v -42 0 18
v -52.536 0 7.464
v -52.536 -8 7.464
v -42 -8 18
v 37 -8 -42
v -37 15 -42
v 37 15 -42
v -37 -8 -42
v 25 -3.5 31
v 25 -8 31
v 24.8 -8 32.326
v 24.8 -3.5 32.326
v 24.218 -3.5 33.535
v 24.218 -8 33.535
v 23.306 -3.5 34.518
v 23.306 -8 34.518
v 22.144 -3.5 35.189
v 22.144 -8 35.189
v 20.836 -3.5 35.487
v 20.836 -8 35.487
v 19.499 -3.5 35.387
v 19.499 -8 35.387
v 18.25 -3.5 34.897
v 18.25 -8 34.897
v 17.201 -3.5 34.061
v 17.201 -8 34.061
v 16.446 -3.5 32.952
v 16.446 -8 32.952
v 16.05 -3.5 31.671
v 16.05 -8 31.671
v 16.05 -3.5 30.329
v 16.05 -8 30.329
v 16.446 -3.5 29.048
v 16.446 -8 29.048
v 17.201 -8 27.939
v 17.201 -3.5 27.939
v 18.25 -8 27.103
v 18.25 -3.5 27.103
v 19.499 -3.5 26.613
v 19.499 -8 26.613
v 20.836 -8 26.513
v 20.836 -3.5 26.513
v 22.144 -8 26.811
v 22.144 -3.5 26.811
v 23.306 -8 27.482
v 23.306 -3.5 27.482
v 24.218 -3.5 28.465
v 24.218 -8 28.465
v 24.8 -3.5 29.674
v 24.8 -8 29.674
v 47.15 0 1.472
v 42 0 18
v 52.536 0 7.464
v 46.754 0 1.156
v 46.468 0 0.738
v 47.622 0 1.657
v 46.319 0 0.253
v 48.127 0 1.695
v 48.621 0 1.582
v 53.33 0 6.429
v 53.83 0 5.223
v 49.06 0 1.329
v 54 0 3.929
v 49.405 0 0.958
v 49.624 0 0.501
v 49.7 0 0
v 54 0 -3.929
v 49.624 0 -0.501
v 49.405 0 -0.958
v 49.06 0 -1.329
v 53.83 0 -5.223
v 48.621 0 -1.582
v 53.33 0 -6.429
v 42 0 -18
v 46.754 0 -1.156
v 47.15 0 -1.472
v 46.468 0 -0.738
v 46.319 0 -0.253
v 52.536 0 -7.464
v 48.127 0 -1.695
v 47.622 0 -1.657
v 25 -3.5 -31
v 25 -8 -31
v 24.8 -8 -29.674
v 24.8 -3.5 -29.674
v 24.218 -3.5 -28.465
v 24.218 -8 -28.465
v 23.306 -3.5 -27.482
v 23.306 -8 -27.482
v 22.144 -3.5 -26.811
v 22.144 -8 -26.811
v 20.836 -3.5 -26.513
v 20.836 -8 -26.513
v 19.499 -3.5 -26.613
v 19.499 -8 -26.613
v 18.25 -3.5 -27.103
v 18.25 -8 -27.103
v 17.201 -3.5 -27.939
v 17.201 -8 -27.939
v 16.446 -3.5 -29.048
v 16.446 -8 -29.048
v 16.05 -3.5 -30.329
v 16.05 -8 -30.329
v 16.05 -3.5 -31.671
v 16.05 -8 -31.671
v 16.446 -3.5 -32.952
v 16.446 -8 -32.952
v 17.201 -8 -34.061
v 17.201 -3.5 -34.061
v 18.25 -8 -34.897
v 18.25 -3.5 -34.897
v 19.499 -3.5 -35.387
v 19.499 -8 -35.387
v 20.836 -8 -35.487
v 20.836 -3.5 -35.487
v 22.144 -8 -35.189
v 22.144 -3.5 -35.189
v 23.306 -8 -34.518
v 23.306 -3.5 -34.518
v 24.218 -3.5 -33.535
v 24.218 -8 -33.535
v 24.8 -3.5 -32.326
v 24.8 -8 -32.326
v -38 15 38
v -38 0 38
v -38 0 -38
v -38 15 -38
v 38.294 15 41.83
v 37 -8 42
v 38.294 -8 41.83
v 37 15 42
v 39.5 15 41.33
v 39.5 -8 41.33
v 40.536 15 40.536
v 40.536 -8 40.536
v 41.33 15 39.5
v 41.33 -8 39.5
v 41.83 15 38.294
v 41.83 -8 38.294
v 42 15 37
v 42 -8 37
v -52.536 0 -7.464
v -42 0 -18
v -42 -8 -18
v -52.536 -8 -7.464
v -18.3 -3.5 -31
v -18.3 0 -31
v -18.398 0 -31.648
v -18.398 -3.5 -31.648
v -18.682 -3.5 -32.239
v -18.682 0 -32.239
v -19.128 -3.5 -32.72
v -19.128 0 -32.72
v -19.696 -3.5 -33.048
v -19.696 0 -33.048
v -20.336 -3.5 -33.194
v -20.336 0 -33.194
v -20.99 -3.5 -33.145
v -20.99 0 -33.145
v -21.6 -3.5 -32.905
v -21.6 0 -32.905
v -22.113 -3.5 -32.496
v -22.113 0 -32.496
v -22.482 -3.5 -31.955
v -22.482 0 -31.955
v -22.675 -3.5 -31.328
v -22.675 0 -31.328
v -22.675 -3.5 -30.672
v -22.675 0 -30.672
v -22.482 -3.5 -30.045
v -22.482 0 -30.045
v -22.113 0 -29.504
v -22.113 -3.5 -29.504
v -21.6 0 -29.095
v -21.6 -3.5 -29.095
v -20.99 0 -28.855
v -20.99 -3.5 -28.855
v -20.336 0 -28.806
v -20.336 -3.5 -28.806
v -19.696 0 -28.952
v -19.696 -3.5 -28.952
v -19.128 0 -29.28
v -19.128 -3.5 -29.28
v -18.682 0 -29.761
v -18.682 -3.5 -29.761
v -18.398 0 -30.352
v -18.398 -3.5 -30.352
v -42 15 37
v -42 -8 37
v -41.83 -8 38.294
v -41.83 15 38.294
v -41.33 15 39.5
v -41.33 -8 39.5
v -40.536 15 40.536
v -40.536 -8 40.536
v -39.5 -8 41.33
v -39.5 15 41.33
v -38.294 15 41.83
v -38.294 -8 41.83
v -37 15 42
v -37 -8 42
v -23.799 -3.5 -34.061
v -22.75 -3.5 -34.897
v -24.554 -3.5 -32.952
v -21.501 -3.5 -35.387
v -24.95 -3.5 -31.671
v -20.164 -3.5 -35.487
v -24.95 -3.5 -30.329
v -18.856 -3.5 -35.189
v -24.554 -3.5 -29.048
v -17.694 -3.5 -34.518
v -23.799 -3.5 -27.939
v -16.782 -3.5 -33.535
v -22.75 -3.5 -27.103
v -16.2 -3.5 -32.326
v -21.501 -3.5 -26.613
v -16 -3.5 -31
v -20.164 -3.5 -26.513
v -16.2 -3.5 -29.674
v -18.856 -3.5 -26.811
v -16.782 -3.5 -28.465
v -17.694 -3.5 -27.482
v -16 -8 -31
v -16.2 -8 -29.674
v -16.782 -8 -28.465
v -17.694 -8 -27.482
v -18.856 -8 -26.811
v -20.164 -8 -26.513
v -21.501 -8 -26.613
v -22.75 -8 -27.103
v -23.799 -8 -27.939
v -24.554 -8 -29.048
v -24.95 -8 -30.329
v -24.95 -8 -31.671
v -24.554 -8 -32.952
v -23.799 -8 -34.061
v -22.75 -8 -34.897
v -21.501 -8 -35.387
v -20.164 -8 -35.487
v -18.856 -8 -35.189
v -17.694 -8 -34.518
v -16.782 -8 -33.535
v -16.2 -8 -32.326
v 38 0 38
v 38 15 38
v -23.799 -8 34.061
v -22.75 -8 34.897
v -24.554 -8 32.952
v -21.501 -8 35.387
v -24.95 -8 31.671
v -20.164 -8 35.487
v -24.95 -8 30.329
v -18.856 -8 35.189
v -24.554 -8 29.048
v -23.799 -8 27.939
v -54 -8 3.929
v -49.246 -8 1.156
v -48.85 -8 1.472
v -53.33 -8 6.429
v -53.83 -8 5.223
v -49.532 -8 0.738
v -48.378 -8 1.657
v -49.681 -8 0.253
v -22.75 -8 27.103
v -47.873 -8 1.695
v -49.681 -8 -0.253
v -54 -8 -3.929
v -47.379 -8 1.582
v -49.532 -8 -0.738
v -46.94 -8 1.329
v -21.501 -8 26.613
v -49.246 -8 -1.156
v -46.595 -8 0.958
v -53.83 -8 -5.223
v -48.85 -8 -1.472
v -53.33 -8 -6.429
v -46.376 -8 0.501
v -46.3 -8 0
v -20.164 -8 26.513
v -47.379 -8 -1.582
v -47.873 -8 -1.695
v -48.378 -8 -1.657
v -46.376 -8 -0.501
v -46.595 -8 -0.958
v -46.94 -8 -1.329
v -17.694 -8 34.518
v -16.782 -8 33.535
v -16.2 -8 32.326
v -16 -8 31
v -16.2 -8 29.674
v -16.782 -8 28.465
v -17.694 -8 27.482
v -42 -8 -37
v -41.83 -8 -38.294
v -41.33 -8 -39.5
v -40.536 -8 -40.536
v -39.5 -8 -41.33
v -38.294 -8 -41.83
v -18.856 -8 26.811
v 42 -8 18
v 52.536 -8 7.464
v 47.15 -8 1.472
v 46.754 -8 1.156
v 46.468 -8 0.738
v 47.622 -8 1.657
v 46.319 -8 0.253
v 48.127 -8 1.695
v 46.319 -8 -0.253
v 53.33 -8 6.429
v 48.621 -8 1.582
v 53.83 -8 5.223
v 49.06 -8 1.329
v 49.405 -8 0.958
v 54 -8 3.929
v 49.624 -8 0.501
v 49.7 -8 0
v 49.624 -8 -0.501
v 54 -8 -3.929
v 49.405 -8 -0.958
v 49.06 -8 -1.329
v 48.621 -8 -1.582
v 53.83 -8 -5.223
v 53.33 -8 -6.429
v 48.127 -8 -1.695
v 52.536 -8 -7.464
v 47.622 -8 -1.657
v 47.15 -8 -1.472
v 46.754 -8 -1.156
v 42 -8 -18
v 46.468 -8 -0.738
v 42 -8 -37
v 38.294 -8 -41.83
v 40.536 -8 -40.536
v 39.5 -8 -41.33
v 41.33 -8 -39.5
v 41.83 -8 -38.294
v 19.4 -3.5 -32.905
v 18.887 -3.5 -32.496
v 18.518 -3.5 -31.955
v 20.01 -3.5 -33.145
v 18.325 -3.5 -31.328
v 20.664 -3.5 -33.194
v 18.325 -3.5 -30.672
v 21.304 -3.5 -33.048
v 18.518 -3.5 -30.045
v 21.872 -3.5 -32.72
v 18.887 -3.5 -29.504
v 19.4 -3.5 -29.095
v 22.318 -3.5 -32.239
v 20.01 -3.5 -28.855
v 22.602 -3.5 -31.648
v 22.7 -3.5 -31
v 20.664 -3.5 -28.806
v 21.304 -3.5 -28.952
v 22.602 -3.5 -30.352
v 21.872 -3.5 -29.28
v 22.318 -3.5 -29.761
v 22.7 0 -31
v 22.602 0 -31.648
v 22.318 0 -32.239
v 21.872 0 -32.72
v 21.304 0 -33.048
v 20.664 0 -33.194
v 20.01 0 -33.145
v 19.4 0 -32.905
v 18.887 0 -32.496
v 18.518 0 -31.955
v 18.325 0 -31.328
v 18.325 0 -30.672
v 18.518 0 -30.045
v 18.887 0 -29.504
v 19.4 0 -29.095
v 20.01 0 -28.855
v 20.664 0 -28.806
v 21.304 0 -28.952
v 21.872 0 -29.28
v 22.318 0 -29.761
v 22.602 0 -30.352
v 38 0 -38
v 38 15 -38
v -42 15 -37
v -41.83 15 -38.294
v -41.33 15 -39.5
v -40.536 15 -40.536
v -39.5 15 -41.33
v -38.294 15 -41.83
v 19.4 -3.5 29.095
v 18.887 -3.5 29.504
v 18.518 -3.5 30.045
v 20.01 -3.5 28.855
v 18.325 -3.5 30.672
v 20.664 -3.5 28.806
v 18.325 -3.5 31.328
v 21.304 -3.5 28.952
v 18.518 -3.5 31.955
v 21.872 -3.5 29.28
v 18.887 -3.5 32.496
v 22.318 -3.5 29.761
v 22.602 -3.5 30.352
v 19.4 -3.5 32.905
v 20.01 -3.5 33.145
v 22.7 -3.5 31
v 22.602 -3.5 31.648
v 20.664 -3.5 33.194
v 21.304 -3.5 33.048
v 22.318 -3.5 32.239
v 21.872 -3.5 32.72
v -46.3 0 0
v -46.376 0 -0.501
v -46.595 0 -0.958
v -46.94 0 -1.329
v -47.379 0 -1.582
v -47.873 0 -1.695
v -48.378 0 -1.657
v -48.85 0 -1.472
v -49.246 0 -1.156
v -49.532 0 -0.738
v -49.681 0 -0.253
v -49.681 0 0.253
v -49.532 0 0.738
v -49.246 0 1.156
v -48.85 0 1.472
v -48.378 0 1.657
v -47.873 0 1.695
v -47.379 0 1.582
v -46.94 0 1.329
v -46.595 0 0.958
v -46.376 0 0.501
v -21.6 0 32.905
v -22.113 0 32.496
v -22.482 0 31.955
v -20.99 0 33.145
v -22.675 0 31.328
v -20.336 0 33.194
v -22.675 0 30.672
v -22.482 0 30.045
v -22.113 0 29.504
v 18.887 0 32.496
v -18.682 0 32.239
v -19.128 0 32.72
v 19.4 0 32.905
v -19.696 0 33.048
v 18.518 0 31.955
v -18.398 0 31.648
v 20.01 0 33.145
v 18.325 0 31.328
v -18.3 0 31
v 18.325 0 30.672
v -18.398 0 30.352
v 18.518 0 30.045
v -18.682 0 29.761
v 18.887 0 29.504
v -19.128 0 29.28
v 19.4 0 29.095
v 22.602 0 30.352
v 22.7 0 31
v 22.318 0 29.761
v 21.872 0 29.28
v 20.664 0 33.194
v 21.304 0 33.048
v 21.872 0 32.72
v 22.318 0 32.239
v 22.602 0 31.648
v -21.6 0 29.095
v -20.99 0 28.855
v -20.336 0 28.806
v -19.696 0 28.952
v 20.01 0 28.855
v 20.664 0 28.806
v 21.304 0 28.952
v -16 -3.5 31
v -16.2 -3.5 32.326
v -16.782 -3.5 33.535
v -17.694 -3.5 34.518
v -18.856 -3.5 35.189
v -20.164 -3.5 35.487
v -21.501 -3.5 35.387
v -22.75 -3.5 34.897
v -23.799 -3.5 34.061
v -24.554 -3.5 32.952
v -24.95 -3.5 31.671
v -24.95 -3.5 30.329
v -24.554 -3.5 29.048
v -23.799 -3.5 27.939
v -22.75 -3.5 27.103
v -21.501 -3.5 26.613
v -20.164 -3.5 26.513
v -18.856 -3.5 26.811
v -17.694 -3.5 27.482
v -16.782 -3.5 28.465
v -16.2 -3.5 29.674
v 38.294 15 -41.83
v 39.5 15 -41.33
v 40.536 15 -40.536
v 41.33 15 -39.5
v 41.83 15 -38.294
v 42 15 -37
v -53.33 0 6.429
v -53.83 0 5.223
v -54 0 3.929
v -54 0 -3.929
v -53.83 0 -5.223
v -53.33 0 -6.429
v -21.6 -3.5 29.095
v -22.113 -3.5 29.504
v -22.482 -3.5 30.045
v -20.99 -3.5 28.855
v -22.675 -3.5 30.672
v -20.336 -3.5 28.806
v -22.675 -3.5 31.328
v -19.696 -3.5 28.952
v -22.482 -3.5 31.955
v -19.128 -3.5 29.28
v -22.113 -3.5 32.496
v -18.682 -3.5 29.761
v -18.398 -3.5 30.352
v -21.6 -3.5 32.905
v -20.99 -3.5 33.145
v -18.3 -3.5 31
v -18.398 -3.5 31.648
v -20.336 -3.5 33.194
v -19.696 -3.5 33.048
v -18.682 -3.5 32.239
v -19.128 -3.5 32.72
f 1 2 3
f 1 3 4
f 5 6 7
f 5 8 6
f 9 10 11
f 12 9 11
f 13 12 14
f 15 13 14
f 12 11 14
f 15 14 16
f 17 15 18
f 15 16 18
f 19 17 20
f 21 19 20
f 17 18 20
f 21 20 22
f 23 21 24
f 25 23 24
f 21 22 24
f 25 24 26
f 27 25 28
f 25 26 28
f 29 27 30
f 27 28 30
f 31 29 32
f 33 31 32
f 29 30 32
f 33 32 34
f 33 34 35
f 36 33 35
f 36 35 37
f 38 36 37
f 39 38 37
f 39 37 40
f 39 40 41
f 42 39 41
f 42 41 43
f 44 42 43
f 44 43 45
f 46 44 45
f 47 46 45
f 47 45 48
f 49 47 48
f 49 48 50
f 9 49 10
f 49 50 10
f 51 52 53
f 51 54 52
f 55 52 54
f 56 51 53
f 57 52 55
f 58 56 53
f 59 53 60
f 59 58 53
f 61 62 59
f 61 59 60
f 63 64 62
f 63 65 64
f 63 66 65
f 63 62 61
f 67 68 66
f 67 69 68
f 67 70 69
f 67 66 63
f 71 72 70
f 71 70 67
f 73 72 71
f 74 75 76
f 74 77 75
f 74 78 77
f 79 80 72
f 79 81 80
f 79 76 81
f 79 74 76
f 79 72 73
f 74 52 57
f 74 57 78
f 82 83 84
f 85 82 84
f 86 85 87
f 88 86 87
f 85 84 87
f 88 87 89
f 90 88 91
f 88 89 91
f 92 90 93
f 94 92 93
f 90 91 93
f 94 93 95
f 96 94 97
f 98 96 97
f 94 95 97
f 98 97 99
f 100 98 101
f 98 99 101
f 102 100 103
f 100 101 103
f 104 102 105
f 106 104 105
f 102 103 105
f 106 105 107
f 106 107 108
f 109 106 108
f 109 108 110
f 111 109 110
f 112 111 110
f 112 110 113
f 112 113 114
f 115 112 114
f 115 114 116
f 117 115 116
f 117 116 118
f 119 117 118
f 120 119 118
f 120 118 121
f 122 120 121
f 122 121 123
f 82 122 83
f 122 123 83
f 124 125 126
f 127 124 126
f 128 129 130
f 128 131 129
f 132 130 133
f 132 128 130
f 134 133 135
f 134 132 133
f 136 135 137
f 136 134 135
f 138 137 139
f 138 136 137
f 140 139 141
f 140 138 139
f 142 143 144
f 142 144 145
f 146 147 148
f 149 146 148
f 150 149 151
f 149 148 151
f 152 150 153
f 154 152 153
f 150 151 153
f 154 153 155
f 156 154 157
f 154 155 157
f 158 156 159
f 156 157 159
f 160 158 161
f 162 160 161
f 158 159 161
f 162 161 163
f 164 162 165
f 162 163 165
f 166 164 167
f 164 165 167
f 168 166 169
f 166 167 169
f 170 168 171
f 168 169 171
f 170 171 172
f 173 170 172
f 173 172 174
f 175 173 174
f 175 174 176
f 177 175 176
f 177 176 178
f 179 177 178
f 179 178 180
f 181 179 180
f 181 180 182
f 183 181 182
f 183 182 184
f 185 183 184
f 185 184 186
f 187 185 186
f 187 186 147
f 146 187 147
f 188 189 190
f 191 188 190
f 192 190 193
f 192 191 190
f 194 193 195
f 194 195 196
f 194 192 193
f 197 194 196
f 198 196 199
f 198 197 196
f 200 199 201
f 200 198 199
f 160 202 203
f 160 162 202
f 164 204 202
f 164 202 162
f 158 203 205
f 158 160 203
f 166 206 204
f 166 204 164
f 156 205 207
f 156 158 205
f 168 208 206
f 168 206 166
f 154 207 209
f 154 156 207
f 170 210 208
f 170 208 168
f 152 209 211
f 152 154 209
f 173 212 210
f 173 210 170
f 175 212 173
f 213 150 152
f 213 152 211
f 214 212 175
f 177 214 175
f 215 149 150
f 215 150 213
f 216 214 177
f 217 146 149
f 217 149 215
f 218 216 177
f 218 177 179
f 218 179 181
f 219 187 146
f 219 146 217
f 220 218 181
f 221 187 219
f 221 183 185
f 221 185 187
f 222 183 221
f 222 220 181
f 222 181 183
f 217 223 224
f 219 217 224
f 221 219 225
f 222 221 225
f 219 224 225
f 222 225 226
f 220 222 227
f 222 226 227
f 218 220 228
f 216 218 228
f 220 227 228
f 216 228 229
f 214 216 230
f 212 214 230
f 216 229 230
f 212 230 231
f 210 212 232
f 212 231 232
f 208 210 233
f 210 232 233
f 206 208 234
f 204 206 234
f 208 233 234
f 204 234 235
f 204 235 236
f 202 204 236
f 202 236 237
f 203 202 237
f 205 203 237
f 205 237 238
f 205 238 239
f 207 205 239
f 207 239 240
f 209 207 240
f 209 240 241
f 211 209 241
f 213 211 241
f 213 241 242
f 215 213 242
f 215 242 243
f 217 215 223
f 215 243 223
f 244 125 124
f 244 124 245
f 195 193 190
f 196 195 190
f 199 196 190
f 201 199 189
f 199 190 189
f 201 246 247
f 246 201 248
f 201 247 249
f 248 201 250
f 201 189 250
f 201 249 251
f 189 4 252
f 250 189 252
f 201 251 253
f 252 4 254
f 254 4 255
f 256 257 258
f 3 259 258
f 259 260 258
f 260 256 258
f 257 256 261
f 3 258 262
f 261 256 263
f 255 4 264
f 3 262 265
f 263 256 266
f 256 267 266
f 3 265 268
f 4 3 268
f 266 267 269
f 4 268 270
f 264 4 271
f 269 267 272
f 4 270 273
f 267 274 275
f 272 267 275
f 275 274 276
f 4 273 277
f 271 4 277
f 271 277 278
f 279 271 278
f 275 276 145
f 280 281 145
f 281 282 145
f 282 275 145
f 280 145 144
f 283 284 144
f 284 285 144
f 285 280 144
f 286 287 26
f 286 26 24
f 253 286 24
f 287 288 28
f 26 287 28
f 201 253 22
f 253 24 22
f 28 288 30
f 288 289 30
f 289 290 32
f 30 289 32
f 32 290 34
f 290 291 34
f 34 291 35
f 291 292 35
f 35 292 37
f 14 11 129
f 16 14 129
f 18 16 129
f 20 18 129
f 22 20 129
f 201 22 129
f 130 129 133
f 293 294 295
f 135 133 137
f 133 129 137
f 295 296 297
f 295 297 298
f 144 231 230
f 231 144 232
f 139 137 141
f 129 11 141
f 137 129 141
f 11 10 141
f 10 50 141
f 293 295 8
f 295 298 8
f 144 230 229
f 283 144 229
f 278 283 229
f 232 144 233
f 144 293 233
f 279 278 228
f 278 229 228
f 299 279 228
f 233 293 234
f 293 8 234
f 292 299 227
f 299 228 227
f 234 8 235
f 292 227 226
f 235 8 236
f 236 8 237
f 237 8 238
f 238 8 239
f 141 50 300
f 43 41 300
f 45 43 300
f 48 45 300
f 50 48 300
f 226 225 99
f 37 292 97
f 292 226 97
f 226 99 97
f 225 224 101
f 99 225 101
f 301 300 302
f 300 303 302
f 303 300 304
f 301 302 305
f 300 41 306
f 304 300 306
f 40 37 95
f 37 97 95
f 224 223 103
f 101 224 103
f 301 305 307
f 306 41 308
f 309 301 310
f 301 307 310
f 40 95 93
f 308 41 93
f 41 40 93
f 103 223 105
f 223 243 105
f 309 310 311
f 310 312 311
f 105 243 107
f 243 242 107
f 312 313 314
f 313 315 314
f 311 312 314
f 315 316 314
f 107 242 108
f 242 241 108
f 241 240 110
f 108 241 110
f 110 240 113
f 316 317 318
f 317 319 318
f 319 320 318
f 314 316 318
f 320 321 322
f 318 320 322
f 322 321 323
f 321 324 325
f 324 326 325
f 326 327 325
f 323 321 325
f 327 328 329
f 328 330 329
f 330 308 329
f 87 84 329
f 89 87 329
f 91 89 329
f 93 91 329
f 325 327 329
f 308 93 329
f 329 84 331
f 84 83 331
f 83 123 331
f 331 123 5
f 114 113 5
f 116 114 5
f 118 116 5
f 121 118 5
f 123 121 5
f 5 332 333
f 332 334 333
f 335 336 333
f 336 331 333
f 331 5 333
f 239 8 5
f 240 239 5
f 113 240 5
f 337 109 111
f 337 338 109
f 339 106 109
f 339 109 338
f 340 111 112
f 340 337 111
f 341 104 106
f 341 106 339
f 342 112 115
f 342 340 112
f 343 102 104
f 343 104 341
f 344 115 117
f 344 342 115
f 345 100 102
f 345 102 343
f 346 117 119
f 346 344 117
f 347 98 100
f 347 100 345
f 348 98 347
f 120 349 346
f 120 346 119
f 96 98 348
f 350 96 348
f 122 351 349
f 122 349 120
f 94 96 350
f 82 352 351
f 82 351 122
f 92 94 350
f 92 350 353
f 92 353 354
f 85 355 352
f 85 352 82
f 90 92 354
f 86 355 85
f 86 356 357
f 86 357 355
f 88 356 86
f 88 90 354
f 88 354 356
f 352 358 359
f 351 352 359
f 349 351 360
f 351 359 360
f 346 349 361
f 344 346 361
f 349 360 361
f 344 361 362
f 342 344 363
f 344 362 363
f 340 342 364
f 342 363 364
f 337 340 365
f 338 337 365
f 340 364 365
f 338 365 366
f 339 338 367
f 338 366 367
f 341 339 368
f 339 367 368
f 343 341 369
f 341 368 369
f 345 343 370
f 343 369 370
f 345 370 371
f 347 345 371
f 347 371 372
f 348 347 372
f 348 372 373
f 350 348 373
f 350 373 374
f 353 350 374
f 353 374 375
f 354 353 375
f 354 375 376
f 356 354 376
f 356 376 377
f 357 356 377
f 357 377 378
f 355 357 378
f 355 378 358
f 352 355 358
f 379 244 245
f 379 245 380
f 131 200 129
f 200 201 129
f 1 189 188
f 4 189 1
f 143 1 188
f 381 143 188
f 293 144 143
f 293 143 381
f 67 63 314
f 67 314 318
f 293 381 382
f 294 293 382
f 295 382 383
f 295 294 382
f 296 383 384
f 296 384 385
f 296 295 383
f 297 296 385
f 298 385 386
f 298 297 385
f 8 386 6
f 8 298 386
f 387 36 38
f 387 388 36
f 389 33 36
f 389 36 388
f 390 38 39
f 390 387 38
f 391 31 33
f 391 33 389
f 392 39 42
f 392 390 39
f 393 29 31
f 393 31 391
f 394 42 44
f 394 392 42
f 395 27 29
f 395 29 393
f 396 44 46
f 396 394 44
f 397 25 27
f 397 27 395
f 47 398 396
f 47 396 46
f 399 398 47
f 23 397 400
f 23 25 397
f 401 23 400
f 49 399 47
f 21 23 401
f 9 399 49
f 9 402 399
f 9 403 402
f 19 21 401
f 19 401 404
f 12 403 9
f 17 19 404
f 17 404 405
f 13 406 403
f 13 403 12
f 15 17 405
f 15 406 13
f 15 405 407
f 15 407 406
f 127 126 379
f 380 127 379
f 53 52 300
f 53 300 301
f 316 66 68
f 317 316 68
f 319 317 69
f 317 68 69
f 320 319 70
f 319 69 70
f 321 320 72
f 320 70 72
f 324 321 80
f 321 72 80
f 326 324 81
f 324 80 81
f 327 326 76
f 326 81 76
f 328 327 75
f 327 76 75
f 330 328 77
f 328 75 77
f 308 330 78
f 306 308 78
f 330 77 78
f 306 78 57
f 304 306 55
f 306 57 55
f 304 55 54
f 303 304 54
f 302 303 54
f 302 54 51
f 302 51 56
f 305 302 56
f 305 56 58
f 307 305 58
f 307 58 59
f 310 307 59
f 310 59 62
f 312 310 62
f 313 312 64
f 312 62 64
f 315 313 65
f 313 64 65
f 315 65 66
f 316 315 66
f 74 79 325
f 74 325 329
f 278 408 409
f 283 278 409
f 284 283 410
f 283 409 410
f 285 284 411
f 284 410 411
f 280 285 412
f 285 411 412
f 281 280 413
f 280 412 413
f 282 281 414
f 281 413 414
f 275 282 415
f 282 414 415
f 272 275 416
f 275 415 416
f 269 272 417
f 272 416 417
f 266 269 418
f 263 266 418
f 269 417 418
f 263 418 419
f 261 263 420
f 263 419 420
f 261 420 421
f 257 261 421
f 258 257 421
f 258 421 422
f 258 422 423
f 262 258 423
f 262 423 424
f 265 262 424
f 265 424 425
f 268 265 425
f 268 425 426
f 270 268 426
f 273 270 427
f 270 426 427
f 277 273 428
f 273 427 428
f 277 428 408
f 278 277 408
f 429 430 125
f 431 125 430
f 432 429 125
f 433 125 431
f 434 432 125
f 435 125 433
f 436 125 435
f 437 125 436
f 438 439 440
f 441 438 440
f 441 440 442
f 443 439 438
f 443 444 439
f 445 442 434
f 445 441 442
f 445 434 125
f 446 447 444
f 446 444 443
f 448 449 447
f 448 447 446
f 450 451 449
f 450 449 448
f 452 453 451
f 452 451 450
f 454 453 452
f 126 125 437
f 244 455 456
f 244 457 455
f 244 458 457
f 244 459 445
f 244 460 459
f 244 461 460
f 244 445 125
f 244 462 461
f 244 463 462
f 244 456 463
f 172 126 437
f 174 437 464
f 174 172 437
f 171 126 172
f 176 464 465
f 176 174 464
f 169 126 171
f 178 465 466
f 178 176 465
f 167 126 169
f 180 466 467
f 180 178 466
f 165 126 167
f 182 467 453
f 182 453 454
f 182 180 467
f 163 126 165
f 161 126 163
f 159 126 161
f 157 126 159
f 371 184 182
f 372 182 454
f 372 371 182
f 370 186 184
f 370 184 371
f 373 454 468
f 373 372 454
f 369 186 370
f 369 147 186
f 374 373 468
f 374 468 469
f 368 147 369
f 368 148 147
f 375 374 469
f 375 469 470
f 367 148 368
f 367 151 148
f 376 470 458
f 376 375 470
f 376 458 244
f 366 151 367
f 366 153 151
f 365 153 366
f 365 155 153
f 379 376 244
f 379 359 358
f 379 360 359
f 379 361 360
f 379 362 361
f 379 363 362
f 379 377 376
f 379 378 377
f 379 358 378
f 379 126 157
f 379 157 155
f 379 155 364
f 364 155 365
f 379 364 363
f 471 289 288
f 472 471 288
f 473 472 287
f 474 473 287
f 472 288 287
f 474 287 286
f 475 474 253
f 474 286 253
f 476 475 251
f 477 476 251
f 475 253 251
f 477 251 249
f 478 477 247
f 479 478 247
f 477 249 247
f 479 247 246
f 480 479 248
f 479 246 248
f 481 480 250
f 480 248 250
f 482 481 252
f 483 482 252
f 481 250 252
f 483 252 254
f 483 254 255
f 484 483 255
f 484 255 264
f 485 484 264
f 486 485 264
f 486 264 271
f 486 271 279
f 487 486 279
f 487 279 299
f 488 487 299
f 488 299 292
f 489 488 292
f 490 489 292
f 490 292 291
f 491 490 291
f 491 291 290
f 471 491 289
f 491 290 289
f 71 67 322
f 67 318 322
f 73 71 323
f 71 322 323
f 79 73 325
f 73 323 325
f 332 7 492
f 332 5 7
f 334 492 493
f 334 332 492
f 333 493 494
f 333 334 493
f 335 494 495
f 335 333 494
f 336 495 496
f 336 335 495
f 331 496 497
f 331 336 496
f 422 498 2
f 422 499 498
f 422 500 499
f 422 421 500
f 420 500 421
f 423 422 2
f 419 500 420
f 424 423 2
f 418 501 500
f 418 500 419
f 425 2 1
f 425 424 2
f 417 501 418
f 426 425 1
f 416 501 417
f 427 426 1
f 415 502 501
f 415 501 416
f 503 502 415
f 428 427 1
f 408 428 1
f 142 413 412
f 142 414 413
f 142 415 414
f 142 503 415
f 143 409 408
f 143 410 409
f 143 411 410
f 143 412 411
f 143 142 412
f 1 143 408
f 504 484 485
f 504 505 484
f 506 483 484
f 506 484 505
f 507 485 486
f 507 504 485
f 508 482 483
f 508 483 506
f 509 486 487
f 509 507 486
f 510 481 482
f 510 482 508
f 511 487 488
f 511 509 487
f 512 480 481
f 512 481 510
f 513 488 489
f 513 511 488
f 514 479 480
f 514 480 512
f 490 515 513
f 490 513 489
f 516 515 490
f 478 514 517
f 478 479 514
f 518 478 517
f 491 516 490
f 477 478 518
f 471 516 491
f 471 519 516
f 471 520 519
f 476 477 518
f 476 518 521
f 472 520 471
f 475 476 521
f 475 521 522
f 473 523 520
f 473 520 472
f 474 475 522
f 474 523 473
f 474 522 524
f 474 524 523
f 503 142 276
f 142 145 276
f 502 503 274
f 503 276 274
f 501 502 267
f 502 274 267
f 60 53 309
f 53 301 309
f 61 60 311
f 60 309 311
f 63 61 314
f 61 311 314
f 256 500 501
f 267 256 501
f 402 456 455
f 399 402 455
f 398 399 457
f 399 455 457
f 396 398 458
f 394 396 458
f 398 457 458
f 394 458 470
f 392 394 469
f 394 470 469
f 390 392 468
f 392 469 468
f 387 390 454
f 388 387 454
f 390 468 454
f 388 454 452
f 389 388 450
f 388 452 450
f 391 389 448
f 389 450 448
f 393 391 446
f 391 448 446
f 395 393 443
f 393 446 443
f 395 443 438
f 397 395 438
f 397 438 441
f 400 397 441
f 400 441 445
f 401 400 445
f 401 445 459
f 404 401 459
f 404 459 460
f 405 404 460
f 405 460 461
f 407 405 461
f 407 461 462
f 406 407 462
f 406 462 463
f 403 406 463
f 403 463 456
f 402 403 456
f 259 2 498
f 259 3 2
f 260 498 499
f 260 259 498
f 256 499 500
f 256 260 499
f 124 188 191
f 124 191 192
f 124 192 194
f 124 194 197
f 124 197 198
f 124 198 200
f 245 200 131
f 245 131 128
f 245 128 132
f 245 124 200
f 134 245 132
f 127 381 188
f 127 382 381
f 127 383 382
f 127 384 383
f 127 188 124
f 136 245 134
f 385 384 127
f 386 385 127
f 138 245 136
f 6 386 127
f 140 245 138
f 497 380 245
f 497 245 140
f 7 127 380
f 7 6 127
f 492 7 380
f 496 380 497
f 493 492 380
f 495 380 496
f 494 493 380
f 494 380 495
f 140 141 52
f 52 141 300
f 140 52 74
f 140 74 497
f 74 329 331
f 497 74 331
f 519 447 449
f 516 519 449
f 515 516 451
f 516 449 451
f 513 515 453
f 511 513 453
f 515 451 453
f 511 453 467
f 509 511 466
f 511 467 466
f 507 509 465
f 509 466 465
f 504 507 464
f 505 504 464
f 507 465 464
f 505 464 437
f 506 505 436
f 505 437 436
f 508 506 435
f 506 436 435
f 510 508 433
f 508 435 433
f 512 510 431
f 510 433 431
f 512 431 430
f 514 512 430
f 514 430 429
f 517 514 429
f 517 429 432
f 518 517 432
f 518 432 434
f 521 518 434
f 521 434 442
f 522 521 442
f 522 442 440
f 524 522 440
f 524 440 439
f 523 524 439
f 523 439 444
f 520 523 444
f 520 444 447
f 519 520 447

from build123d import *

# Parameters (mm, degrees)
SKETCH1_R           = 1.7
SKETCH1_R_2         = 2.2
BOSS_EXTRUDE1_DEPTH = 8
SKETCH1_3_W         = 76
SKETCH1_3_H         = 76
BOSS_EXTRUDE2_DEPTH = 15
SKETCH2_R           = 4.5
CUT_EXTRUDE1_DEPTH  = 4.5
FILLET1_R           = 5


with BuildPart() as part:
    # Sketch1 → Boss-Extrude1 (new body)
    with BuildSketch(Plane(origin=(0, 0, 0), x_dir=(1, 0, 0), z_dir=(0, 1, 0))):
        Polygon((42, 42), (-42, 42), (-42, 18), (-54, 6), (-54, -6), (-42, -18), (-42, -42), (42, -42), (42, -18), (54, -6), (54, 6), (42, 18), align=None)
        with Locations((48, 0)):
            Circle(SKETCH1_R, mode=Mode.SUBTRACT)
        with Locations((-48, 0)):
            Circle(SKETCH1_R, mode=Mode.SUBTRACT)
        with Locations((-20.5, -31)):
            Circle(SKETCH1_R_2, mode=Mode.SUBTRACT)
        with Locations((20.5, -31)):
            Circle(SKETCH1_R_2, mode=Mode.SUBTRACT)
        with Locations((-20.5, 31)):
            Circle(SKETCH1_R_2, mode=Mode.SUBTRACT)
        with Locations((20.5, 31)):
            Circle(SKETCH1_R_2, mode=Mode.SUBTRACT)
    extrude(amount=-BOSS_EXTRUDE1_DEPTH)

    # Sketch1<3> → Boss-Extrude2 (add)
    with BuildSketch(Plane(origin=(0, 0, 0), x_dir=(1, 0, 0), z_dir=(0, 1, 0))):
        Polygon((42, 42), (-42, 42), (-42, 18), (-42, 6), (-42, -6), (-42, -18), (-42, -42), (42, -42), (42, -18), (42, -6), (42, 6), (42, 18), align=None)
        Rectangle(SKETCH1_3_W, SKETCH1_3_H, mode=Mode.SUBTRACT)
    extrude(amount=BOSS_EXTRUDE2_DEPTH)

    # Sketch2 → Cut-Extrude1 (cut)
    with BuildSketch(Plane.XZ.offset(8)):
        with Locations((-20.5, 31)):
            Circle(SKETCH2_R)
        with Locations((-20.5, -31)):
            Circle(SKETCH2_R)
        with Locations((20.5, -31)):
            Circle(SKETCH2_R)
        with Locations((20.5, 31)):
            Circle(SKETCH2_R)
    extrude(amount=-CUT_EXTRUDE1_DEPTH, mode=Mode.SUBTRACT)

    # Fillet1
    fillet1_edges = [part.edges().sort_by_distance(p)[0] for p in [
        (42, 3.5, 42),
        (54, -4, 6),
        (54, -4, -6),
        (42, 3.5, -42),
        (-42, 3.5, -42),
        (-42, 3.5, 42),
        (-54, -4, 6),
        (-54, -4, -6),
    ]]
    fillet(fillet1_edges, radius=FILLET1_R)


solid = part.part
